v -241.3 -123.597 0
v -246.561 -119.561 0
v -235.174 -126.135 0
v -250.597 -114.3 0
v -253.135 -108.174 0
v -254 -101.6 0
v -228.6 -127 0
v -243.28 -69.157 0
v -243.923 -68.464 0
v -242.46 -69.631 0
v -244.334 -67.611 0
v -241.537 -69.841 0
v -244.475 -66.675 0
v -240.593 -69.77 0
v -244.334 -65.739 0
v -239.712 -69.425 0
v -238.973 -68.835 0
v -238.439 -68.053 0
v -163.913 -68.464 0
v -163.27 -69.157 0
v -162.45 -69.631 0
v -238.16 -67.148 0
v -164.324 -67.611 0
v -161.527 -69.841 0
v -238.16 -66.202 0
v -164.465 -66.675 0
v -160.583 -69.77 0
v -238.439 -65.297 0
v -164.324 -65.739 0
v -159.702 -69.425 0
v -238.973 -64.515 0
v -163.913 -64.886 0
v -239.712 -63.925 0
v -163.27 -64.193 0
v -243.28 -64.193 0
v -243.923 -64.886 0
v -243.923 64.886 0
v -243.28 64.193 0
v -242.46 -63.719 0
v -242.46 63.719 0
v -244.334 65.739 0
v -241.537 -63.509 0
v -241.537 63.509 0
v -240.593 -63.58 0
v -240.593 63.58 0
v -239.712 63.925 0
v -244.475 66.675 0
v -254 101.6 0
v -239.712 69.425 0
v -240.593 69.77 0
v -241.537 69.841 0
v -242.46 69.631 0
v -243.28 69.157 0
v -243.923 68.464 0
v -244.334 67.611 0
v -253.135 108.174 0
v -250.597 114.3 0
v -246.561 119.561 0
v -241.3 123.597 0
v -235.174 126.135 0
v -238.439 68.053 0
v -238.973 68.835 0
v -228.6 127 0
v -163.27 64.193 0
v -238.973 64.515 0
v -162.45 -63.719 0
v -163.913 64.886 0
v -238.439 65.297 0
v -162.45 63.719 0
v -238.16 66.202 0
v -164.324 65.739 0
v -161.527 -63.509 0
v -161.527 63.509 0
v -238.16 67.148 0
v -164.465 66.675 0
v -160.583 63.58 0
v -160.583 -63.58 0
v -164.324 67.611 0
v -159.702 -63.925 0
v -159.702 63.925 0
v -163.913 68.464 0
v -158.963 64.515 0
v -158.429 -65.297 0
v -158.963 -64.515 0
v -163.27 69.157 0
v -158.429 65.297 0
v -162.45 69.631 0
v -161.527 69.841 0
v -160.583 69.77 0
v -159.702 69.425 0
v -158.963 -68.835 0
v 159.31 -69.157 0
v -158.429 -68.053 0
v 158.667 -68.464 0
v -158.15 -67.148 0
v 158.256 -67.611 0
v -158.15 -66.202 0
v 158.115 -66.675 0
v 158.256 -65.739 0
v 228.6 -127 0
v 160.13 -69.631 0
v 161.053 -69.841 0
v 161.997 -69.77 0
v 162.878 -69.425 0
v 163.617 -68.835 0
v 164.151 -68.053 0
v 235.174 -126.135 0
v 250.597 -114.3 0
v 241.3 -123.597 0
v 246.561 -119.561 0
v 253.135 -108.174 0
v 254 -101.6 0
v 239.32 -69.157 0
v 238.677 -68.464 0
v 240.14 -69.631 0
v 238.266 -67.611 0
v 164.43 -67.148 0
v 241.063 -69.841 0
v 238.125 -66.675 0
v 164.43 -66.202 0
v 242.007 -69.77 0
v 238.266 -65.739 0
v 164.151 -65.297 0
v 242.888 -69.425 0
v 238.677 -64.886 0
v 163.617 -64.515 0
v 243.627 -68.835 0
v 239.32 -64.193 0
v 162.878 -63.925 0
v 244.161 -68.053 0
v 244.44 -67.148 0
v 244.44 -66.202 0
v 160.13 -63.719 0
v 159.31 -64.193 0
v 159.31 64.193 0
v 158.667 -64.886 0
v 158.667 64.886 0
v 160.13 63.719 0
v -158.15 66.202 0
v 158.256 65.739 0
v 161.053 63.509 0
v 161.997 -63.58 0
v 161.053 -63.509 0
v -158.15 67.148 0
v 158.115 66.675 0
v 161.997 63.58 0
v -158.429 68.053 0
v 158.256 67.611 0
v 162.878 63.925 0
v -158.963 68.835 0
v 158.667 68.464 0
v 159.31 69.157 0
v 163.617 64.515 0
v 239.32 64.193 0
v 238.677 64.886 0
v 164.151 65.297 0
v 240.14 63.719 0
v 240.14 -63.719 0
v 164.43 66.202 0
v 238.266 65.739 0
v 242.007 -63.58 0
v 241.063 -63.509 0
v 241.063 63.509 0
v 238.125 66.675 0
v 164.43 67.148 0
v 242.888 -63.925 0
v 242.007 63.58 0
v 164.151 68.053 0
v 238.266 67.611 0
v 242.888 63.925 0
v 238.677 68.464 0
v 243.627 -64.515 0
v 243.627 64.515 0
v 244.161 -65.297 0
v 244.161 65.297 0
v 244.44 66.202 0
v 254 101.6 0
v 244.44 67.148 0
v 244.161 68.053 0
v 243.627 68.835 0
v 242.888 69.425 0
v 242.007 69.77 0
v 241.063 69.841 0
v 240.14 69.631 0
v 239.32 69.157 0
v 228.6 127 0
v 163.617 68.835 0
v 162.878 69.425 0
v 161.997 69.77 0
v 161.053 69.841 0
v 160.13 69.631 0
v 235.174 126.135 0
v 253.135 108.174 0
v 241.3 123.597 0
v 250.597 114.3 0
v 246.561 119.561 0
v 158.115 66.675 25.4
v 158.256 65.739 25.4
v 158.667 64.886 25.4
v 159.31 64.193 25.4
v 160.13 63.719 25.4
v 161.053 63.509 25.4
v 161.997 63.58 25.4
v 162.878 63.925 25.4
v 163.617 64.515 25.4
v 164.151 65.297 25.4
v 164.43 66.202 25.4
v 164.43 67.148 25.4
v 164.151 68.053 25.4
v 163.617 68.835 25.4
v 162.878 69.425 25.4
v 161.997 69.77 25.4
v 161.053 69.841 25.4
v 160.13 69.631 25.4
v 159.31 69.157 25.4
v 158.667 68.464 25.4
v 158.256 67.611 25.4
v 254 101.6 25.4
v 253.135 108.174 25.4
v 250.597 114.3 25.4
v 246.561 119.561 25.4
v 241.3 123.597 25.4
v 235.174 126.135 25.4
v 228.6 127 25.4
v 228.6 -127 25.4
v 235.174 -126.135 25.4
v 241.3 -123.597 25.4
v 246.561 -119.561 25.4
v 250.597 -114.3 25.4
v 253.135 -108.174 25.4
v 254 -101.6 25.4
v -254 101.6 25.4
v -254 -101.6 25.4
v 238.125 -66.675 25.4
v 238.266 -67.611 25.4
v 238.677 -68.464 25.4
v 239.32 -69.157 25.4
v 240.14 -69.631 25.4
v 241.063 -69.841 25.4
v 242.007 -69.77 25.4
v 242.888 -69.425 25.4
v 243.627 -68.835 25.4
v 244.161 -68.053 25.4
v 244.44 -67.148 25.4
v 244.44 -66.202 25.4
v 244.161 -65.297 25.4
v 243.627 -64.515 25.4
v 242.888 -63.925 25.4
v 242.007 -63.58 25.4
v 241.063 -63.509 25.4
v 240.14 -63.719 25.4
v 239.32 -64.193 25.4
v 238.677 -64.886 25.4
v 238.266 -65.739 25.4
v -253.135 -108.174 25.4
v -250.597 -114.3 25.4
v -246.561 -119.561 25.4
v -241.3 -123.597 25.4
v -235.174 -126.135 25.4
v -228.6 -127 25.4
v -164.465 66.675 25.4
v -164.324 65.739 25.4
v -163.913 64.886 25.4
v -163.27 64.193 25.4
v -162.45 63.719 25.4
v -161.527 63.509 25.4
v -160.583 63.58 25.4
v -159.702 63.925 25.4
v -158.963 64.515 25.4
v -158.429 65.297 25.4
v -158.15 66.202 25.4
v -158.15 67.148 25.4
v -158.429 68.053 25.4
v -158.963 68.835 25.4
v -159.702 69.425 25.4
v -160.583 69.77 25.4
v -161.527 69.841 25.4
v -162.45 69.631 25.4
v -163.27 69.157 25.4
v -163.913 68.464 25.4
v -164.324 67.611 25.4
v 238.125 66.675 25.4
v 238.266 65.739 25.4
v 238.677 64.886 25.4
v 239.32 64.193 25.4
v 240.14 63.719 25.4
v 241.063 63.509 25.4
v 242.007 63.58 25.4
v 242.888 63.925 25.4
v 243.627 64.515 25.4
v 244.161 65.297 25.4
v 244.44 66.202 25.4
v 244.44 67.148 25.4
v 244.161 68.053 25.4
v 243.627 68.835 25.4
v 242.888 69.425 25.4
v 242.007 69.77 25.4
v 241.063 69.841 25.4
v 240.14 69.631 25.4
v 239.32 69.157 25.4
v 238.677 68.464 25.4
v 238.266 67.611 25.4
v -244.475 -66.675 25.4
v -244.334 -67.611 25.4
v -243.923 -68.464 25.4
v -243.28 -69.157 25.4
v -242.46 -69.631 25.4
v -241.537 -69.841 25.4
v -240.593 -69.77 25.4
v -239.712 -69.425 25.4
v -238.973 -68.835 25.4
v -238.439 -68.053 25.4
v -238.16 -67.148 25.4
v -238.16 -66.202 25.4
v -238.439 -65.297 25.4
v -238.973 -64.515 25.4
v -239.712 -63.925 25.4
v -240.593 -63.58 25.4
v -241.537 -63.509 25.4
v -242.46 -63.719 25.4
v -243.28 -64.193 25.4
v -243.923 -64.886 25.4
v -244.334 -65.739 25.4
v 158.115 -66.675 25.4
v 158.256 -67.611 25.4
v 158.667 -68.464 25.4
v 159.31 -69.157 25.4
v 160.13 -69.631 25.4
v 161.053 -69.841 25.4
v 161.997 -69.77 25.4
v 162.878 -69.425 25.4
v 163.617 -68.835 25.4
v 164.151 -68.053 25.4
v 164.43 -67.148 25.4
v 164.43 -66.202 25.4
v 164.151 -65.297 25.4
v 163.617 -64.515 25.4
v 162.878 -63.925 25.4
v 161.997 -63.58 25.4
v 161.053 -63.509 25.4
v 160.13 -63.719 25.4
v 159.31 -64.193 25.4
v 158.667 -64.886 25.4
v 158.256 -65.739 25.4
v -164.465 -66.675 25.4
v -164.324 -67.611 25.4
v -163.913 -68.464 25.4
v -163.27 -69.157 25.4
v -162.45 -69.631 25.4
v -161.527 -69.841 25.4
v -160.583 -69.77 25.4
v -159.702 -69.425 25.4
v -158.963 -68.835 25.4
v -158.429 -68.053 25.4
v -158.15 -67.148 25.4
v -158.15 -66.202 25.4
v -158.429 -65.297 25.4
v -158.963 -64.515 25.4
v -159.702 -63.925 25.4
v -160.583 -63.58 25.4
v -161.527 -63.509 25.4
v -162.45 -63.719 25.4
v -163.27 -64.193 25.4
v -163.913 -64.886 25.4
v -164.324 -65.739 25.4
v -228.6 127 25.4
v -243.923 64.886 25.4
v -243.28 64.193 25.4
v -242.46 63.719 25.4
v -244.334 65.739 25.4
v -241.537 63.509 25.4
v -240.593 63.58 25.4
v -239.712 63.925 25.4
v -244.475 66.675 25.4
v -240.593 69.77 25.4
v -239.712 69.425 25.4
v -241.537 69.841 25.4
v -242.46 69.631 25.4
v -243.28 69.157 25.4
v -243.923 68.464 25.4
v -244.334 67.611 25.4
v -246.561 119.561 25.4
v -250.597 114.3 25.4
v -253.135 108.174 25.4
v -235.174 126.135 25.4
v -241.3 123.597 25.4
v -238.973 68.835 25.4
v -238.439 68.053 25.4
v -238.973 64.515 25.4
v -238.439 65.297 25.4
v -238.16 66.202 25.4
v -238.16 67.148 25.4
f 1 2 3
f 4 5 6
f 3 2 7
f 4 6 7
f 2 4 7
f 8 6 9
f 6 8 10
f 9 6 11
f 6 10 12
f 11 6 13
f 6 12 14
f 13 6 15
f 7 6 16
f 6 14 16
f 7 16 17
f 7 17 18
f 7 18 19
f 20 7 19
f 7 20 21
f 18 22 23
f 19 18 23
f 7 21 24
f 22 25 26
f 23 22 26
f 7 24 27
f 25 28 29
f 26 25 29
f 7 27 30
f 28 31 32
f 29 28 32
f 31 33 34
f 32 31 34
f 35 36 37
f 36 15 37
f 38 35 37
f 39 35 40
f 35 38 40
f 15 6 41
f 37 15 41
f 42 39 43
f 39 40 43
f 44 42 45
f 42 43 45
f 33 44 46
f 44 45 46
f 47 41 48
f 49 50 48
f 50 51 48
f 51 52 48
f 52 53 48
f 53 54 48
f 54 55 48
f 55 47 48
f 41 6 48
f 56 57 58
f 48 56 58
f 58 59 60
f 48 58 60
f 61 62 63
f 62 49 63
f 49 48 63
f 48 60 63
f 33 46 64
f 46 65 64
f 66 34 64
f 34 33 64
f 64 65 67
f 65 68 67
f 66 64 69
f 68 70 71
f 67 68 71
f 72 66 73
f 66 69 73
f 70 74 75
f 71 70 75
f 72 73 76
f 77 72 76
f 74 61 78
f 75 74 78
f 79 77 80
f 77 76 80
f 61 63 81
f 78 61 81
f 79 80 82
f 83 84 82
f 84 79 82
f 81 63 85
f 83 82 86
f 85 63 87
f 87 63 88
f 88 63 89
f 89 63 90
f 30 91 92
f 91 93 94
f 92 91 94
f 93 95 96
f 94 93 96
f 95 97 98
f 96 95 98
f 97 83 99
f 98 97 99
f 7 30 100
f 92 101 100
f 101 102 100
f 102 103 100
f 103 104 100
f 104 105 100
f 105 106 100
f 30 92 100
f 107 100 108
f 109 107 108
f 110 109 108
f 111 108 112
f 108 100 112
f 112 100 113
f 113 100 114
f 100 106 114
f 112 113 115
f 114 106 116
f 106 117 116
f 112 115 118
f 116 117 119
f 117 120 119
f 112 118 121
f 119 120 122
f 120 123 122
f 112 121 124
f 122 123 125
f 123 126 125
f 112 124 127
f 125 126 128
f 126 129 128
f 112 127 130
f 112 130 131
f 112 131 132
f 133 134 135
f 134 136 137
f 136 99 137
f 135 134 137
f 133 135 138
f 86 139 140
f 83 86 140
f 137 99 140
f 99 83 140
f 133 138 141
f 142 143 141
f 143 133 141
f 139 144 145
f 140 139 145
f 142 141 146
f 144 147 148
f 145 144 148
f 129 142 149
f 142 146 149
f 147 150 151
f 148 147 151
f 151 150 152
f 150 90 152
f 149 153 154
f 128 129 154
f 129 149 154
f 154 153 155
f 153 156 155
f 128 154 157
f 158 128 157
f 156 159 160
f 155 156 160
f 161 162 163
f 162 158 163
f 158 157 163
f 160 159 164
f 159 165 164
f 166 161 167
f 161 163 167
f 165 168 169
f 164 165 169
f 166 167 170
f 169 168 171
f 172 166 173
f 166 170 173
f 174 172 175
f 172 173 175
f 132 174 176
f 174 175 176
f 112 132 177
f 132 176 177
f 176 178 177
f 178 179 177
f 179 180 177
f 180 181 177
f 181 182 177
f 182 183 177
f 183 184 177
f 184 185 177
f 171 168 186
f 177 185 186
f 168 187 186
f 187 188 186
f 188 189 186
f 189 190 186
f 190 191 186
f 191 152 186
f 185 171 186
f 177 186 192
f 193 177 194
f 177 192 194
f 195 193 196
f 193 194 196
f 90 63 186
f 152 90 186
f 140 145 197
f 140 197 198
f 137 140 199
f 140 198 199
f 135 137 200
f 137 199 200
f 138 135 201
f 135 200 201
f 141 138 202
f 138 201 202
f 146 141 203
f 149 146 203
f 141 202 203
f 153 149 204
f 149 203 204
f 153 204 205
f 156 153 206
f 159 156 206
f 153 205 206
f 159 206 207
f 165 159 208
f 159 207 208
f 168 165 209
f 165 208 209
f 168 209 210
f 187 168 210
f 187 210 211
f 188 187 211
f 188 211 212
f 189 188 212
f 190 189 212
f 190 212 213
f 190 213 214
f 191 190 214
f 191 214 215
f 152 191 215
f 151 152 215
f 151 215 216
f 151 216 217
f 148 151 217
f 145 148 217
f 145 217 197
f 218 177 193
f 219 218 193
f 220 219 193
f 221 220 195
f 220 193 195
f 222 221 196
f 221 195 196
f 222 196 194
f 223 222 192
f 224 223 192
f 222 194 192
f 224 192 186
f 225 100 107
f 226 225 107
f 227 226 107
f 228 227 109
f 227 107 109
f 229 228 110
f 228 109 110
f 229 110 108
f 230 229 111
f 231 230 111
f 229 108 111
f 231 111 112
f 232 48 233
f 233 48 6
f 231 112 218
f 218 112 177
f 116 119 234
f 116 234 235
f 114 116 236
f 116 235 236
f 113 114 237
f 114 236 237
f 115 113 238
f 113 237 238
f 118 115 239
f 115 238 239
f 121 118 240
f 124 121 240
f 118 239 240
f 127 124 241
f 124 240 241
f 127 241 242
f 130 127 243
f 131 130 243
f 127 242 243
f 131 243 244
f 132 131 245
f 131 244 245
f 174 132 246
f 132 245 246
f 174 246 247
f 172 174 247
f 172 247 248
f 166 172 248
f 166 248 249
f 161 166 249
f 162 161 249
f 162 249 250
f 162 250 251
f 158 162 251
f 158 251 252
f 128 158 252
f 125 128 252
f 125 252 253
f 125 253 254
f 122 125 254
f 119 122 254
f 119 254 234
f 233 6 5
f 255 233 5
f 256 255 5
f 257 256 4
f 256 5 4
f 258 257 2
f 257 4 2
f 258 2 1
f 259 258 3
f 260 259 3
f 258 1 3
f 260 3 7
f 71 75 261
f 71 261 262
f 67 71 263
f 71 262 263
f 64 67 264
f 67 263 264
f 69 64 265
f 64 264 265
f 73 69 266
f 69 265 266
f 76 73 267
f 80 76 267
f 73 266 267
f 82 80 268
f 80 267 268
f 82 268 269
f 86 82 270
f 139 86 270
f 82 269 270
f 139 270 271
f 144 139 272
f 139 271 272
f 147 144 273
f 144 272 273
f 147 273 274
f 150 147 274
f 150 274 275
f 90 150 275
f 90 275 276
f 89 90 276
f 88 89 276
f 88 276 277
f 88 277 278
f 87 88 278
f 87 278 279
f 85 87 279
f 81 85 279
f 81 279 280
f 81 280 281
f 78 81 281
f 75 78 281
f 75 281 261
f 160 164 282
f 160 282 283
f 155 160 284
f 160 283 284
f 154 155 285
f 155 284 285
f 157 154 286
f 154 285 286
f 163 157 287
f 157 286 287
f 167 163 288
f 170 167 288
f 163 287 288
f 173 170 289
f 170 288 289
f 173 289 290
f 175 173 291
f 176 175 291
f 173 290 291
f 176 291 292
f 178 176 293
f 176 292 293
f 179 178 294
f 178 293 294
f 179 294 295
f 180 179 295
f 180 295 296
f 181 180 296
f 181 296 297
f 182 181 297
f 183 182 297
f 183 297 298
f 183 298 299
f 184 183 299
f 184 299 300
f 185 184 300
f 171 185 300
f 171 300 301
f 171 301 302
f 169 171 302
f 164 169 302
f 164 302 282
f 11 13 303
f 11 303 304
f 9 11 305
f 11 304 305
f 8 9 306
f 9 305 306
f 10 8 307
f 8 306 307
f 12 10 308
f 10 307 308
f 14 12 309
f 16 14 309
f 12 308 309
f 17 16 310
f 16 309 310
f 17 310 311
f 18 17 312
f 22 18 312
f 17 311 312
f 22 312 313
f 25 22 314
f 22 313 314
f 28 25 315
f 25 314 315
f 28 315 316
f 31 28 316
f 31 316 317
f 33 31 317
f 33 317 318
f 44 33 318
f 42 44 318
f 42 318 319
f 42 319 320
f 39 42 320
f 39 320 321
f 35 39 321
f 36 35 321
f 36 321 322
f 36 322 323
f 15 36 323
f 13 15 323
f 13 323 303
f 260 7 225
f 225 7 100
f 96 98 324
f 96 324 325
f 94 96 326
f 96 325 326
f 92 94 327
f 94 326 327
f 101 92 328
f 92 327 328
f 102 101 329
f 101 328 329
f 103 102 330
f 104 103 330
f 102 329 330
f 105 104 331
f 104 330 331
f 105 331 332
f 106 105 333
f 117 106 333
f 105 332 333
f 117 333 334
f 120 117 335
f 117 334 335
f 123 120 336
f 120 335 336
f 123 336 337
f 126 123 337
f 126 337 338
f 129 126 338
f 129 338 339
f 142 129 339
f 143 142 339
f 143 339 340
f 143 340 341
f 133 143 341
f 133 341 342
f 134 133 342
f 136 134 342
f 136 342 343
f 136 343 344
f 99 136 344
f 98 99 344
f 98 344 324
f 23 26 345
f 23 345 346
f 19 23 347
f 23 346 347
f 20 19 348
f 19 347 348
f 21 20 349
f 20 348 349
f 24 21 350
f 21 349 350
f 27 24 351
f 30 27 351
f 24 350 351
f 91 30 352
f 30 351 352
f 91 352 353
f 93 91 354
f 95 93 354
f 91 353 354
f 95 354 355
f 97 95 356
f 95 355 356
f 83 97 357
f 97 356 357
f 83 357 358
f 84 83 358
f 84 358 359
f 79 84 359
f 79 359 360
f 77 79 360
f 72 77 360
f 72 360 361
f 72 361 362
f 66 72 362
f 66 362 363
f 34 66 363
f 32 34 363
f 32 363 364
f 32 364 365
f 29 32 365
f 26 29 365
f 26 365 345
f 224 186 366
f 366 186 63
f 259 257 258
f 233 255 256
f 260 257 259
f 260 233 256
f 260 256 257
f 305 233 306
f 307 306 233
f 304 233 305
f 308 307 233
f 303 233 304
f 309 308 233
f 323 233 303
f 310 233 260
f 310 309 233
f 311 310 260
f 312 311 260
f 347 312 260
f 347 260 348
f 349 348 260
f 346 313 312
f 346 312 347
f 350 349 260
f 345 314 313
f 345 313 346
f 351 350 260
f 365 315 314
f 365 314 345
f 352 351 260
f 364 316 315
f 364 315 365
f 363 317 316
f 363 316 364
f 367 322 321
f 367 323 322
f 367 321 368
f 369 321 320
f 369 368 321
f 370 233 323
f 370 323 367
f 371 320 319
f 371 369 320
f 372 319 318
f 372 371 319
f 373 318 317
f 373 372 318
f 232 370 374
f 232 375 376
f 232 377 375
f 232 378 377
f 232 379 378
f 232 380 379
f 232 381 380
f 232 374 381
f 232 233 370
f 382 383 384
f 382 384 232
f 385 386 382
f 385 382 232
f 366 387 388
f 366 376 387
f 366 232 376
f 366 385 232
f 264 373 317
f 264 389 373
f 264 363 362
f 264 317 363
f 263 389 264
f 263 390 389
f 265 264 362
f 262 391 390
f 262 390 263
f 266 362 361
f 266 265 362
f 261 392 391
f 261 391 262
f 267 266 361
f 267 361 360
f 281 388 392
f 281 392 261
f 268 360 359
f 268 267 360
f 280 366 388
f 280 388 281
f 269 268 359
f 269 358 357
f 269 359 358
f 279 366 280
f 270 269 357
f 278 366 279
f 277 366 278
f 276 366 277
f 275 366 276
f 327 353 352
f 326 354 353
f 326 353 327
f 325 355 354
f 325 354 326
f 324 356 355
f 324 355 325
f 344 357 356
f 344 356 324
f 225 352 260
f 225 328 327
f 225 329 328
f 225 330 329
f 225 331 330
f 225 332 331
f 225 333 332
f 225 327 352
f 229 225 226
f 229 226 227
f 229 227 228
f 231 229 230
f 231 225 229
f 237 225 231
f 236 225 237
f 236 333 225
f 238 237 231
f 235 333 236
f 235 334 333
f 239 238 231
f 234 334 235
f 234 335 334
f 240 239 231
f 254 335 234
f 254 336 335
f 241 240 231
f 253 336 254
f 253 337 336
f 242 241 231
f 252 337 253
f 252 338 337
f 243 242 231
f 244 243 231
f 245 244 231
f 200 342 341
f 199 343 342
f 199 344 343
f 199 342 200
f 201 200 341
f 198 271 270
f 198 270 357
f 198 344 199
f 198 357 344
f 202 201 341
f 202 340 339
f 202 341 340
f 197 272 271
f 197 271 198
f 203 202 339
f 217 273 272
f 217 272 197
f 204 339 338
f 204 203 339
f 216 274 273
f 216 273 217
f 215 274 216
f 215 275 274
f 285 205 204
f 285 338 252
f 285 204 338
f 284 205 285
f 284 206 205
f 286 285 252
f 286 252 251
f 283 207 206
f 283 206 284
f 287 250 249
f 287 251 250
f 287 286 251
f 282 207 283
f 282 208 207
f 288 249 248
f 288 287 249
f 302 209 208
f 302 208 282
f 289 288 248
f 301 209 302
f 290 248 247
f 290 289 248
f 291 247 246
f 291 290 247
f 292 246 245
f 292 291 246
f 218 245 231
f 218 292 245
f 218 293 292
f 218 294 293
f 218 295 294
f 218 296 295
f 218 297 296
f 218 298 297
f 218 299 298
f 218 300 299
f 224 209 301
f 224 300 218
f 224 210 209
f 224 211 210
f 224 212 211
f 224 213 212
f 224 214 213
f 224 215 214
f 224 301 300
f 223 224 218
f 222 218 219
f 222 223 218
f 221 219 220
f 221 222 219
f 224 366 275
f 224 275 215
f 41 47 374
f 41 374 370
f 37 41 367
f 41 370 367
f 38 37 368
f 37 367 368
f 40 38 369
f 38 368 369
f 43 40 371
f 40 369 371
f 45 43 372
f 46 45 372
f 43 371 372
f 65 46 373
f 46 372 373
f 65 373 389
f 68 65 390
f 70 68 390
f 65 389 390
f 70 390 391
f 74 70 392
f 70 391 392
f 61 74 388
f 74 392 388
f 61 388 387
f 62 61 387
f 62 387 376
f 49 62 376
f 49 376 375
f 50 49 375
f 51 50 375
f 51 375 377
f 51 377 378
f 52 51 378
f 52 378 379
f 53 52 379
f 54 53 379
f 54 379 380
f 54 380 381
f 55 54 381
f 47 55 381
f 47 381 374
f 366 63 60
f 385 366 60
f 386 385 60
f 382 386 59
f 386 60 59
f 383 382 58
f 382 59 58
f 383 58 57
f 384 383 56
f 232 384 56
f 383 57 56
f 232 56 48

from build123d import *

# Parameters (mm, degrees)
F1_DEPTH = 25.4
F3_D     = 6.35


with BuildPart() as f1:
    # F0 (on Top) → F1 (new body)
    with BuildSketch(Plane.XY):
        with BuildLine():
            Line((-228.6, -127), (228.6, -127))
            ThreePointArc((228.6, -127), (246.560512, -119.560512), (254, -101.6))
            Line((254, -101.6), (254, 101.6))
            ThreePointArc((254, 101.6), (246.560512, 119.560512), (228.6, 127))
            Line((228.6, 127), (-228.6, 127))
            ThreePointArc((-228.6, 127), (-246.560512, 119.560512), (-254, 101.6))
            Line((-254, 101.6), (-254, -101.6))
            ThreePointArc((-254, -101.6), (-246.560512, -119.560512), (-228.6, -127))
        make_face()
    extrude(amount=F1_DEPTH)

    # F3 (through all)
    with Locations(Plane(origin=(0, 0, 0), x_dir=(1, 0, 0), z_dir=(0, 0, -1))):
        with Locations((-241.3, -66.675), (-161.29, -66.675), (-241.3, 66.675), (-161.29, 66.675), (161.29, 66.675), (241.3, 66.675), (241.3, -66.675), (161.29, -66.675)):
            Hole(F3_D / 2)


solid = f1.part
